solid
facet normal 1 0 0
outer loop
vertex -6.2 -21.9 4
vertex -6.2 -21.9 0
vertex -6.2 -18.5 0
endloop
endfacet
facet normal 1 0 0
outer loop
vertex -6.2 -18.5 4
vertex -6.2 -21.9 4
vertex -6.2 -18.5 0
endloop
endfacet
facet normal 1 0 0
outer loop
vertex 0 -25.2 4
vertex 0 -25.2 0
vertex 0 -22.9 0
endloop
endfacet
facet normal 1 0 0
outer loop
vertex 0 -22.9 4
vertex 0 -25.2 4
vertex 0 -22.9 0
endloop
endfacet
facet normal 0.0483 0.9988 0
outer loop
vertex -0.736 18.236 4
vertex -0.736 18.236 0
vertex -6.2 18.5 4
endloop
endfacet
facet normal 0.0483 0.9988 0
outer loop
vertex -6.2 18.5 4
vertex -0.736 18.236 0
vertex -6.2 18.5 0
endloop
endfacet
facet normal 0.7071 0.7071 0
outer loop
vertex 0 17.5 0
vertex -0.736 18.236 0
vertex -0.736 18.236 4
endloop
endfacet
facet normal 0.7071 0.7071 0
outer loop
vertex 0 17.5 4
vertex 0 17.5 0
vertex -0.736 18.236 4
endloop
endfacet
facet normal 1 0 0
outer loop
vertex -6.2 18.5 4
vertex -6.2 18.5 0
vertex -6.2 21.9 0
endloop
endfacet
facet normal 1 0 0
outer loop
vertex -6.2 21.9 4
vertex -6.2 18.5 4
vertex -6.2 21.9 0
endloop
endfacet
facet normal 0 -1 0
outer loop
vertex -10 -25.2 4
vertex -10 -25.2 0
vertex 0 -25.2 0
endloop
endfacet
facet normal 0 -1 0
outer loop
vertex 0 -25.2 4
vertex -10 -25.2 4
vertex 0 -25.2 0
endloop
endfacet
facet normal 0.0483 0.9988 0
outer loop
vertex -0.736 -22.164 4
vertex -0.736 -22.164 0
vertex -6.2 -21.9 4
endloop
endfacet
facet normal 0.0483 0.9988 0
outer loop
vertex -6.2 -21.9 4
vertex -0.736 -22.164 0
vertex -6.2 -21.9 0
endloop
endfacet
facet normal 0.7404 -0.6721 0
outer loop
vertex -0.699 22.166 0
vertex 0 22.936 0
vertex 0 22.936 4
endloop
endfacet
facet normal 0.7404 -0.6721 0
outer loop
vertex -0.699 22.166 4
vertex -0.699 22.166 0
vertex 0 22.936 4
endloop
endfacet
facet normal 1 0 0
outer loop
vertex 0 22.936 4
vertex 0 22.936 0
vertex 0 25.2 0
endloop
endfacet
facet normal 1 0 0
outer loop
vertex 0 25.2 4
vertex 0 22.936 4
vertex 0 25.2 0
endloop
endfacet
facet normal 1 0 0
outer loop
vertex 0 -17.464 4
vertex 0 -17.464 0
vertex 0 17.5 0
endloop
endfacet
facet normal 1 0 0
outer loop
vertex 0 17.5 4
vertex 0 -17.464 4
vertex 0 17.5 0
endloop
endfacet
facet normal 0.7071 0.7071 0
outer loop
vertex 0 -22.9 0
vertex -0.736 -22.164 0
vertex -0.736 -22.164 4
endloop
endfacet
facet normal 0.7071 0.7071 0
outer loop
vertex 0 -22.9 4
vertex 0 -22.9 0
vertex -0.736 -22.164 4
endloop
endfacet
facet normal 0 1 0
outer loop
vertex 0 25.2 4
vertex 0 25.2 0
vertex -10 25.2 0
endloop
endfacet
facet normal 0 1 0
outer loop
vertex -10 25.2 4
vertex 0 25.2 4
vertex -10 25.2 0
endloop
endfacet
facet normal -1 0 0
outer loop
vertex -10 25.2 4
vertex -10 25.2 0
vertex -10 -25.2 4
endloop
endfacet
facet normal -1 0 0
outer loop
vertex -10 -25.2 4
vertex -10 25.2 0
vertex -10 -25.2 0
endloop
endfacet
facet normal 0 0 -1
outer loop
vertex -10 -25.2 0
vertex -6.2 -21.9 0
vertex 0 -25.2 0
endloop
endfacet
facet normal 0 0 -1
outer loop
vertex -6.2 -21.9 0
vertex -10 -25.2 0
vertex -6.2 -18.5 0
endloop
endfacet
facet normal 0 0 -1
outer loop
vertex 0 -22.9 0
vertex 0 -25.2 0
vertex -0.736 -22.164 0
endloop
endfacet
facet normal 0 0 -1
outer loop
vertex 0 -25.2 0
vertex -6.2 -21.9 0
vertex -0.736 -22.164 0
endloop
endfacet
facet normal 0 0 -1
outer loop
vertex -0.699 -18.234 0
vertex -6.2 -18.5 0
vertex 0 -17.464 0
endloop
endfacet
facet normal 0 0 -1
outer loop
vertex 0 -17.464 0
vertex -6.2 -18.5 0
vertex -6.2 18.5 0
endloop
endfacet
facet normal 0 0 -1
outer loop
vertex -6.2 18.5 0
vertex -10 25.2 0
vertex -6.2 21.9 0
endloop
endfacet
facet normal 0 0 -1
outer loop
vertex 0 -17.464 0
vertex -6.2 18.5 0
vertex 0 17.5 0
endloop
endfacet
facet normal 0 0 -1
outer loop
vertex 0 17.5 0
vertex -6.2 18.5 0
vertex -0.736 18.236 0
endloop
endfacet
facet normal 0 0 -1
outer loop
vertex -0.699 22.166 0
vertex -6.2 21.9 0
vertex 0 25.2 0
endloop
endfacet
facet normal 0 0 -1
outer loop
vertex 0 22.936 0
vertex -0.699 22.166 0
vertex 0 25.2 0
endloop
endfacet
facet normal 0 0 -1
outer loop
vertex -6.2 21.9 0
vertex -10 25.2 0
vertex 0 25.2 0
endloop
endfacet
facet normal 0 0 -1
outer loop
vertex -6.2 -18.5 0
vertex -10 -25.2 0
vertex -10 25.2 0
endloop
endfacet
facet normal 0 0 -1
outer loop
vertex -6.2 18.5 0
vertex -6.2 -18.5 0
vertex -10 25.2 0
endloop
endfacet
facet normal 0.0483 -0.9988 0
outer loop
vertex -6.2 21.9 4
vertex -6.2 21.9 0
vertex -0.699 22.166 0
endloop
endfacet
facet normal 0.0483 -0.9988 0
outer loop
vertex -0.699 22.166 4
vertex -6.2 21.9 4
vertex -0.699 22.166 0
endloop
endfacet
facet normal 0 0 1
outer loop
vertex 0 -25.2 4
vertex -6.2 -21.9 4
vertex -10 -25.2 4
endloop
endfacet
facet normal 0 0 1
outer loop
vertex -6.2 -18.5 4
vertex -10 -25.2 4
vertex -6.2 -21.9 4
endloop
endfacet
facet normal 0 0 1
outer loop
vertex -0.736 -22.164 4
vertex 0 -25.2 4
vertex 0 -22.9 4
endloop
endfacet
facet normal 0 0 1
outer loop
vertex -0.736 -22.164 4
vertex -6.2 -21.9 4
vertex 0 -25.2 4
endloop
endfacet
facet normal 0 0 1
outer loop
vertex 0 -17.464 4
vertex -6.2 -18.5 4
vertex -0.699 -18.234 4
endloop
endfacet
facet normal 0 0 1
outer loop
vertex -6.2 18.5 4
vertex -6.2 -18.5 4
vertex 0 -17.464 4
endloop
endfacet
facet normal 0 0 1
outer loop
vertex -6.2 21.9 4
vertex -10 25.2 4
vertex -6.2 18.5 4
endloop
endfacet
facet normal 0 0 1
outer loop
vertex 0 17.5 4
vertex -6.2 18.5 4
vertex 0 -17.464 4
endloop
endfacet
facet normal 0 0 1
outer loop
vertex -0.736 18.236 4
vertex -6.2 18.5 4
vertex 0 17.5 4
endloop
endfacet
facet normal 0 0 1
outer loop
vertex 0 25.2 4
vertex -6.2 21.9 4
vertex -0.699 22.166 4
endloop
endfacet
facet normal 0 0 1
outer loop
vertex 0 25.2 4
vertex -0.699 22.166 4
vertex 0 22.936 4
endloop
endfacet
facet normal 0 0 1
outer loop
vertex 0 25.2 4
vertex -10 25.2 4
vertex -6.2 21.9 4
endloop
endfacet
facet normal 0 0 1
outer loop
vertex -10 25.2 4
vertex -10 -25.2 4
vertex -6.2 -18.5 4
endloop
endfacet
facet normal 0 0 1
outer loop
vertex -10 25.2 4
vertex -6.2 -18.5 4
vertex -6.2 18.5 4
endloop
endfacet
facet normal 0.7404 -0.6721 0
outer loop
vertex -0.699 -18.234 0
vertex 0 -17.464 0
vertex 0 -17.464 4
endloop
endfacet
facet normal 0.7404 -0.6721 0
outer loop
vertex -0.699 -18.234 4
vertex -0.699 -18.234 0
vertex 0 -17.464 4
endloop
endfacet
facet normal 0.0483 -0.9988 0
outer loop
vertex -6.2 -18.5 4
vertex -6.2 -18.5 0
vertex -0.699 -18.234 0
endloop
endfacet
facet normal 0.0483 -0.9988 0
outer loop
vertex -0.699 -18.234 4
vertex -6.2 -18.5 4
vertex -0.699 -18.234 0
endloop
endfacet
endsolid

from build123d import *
from OCP.BRepFilletAPI import BRepFilletAPI_MakeChamfer

# Parameters (mm, degrees)
BOSS_EXTRUDE1_DEPTH = 4
CHAMFER1_SIZE       = 0.7
CHAMFER1_SIZE2      = 0.736453843


with BuildPart() as part:
    # Sketch1 → Boss-Extrude1 (new body)
    with BuildSketch(Plane.XY):
        Polygon((-10, 0), (0, 0), (0, 18.2), (-6.2, 18.5), (-6.2, 21.9), (0, 22.2), (0, 25.2), (-10, 25.2), align=None)
        Polygon((-6.2, -18.5), (0, -18.2), (0, 0), (-10, 0), (-10, -25.2), (0, -25.2), (0, -22.2), (-6.2, -21.9), align=None)
    extrude(amount=BOSS_EXTRUDE1_DEPTH)

    # Chamfer1: one chamfer whose edges measure the first distance from different faces: ONE call of the kernel's chamfer builder (chamfer() names one face for all edges)
    chamfer1_edges_1 = [part.edges().sort_by_distance(p)[0] for p in [
        (0, 22.2, 2),
    ]]
    chamfer1_side_1 = [part.faces().sort_by_distance(p)[0] for p in [
        (-3.1, 22.05, 2),
    ]]
    chamfer1_edges_2 = [part.edges().sort_by_distance(p)[0] for p in [
        (0, 18.2, 2),
    ]]
    chamfer1_side_2 = [part.faces().sort_by_distance(p)[0] for p in [
        (0, 0, 2),
    ]]
    chamfer1_edges_3 = [part.edges().sort_by_distance(p)[0] for p in [
        (0, -18.2, 2),
    ]]
    chamfer1_side_3 = [part.faces().sort_by_distance(p)[0] for p in [
        (-3.1, -18.35, 2),
    ]]
    chamfer1_edges_4 = [part.edges().sort_by_distance(p)[0] for p in [
        (0, -22.2, 2),
    ]]
    chamfer1_side_4 = [part.faces().sort_by_distance(p)[0] for p in [
        (0, -23.7, 2),
    ]]
    chamfer1 = BRepFilletAPI_MakeChamfer(part.part.solid().wrapped)
    for e in chamfer1_edges_1:
        chamfer1.Add(CHAMFER1_SIZE, CHAMFER1_SIZE2, e.wrapped, chamfer1_side_1[0].wrapped)  # the first distance lies on this face
    for e in chamfer1_edges_2:
        chamfer1.Add(CHAMFER1_SIZE, CHAMFER1_SIZE2, e.wrapped, chamfer1_side_2[0].wrapped)  # the first distance lies on this face
    for e in chamfer1_edges_3:
        chamfer1.Add(CHAMFER1_SIZE, CHAMFER1_SIZE2, e.wrapped, chamfer1_side_3[0].wrapped)  # the first distance lies on this face
    for e in chamfer1_edges_4:
        chamfer1.Add(CHAMFER1_SIZE, CHAMFER1_SIZE2, e.wrapped, chamfer1_side_4[0].wrapped)  # the first distance lies on this face
    add(Compound.cast(chamfer1.Shape()), mode=Mode.REPLACE)


solid = part.part
